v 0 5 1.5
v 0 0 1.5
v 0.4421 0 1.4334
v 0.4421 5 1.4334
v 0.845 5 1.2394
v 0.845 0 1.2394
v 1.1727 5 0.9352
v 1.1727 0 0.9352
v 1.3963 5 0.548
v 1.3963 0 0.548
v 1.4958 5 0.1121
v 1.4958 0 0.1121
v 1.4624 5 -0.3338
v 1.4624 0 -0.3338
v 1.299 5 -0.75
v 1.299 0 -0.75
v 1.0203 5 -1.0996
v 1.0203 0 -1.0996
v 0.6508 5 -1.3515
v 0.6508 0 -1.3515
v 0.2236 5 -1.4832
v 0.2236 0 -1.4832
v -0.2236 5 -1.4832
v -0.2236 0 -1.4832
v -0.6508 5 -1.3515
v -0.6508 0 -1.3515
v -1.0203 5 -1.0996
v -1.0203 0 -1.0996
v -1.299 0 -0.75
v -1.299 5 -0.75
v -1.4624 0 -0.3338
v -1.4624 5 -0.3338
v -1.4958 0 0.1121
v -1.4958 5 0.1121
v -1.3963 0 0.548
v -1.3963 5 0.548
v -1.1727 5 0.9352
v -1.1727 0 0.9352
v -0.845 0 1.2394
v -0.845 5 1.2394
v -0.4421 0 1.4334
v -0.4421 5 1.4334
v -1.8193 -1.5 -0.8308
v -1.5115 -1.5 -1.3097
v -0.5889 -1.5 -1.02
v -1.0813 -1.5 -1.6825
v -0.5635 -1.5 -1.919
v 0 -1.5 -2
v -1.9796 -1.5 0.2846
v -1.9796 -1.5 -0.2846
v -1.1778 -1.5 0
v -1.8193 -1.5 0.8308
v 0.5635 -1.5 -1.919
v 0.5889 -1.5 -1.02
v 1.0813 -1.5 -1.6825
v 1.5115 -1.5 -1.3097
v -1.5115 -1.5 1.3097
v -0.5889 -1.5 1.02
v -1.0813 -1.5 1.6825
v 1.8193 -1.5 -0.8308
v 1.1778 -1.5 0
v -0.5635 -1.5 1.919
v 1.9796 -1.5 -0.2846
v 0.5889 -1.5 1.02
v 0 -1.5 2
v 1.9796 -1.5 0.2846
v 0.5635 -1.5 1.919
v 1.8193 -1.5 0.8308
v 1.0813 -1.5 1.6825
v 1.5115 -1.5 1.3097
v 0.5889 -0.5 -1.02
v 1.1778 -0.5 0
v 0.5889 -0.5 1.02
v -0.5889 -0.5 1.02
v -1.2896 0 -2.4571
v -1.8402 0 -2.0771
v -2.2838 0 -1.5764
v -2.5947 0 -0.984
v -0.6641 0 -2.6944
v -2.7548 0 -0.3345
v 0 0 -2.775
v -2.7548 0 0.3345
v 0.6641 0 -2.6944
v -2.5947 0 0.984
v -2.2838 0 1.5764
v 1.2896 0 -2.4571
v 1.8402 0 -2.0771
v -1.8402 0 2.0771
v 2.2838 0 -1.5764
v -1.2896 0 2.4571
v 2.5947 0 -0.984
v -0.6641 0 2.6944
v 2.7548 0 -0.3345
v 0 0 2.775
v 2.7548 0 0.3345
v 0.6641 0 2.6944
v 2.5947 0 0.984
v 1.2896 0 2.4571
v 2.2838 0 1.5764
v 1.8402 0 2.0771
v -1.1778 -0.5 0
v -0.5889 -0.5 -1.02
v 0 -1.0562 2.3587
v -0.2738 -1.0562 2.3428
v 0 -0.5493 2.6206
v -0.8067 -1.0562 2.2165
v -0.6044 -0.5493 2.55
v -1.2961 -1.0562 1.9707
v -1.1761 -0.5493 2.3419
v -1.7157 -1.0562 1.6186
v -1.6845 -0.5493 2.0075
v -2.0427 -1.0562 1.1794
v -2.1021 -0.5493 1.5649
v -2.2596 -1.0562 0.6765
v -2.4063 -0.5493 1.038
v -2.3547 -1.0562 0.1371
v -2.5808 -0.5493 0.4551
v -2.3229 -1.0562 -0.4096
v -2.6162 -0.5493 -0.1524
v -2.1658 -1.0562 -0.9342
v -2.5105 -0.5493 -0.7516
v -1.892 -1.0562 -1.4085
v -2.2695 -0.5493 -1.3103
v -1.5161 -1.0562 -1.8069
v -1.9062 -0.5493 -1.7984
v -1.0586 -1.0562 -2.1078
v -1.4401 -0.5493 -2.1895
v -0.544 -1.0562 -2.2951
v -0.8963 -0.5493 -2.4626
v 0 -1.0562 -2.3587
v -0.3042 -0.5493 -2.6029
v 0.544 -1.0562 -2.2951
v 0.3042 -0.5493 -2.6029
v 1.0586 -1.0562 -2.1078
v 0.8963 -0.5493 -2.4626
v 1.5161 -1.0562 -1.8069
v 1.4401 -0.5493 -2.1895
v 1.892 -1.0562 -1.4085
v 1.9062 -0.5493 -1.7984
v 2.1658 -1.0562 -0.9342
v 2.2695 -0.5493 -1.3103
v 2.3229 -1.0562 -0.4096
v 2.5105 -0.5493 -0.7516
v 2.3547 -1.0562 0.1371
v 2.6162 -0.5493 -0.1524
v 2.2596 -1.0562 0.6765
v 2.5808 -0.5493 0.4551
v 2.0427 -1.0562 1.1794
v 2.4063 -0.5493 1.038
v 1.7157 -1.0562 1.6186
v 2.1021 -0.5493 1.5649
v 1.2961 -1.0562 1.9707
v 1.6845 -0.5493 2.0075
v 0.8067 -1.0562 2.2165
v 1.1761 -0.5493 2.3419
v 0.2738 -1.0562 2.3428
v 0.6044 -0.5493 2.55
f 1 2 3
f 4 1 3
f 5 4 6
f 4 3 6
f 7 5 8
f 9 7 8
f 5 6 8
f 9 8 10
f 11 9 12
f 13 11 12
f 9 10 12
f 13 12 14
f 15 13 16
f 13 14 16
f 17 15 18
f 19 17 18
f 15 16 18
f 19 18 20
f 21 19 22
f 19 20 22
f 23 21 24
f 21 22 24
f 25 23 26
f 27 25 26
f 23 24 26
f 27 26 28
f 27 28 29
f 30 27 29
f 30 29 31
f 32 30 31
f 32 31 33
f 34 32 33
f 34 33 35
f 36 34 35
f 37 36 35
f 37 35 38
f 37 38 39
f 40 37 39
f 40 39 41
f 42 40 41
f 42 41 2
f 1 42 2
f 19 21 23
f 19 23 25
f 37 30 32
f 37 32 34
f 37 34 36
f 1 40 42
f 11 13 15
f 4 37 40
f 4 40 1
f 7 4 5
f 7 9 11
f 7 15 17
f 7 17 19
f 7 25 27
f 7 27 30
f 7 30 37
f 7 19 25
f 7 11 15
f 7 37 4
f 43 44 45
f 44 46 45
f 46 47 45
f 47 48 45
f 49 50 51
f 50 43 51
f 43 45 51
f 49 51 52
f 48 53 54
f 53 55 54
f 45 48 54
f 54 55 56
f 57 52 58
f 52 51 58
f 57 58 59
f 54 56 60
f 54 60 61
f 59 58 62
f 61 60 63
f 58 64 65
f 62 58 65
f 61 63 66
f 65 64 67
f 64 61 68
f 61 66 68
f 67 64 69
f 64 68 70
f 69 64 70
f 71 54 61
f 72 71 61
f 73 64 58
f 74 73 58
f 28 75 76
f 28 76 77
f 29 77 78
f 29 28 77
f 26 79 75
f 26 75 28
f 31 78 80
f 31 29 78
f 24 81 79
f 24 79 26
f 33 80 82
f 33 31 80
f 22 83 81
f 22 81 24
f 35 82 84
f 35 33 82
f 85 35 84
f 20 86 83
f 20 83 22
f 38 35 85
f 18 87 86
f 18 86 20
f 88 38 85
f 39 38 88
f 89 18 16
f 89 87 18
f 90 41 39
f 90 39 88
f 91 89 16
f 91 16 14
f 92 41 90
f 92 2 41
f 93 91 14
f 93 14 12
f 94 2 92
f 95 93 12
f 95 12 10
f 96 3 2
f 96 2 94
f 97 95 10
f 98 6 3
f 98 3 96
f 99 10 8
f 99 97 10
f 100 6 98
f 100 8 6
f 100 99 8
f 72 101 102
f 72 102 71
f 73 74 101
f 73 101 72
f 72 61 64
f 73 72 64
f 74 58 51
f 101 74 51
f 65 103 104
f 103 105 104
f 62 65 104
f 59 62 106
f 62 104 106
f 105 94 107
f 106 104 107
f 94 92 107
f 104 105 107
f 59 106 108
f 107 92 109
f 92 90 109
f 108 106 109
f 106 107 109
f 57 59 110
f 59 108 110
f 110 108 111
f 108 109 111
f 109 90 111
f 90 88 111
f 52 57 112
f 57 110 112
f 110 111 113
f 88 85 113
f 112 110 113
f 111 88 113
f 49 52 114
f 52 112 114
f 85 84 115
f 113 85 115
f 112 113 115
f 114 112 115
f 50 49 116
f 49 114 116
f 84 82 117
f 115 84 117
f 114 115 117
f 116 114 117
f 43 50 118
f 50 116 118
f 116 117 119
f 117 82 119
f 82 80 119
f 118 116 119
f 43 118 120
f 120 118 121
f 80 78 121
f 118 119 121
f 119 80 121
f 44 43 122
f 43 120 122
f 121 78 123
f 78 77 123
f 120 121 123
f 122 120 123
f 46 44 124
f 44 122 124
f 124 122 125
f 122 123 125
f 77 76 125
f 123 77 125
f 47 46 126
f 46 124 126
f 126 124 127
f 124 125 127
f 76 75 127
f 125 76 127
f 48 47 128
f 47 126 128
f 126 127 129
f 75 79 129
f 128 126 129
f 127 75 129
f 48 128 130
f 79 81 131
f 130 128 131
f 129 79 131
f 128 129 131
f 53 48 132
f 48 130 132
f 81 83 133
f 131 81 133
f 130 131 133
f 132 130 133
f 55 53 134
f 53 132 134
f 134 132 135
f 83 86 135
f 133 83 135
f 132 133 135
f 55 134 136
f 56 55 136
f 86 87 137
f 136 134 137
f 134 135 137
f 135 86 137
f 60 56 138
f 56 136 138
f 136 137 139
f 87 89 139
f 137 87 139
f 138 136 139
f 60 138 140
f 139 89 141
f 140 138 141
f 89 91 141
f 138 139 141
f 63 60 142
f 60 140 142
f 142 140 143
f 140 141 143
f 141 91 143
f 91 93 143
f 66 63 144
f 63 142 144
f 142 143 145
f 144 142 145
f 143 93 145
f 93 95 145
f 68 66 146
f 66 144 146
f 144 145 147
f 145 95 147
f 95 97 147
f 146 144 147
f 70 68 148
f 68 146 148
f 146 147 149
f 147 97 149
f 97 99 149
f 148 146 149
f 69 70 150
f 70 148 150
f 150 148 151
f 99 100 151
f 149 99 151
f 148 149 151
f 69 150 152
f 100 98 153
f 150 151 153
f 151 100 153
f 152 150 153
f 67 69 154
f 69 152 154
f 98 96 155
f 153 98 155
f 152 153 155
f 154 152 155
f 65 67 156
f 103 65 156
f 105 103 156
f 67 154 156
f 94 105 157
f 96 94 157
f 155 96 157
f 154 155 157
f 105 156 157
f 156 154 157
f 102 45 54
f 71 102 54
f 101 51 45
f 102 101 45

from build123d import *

# Parameters (mm, degrees)
SKETCH_1_R          = 1.5
EXTRUDE_1_DEPTH     = 2
SKETCH_2_R          = 2.775
EXTRUDE_2_DEPTH     = 1.5
CUT_EXTRUDE_1_DEPTH = 1
SKETCH_1_8_R        = 1.5
EXTRUDE_5_DEPTH     = 5


with BuildPart() as part:
    # 草图1 → 拉伸1 (new body)
    with BuildSketch(Plane(origin=(0, 0, 0), x_dir=(1, 0, 0), z_dir=(0, 1, 0))):
        Circle(SKETCH_1_R)
    extrude(amount=EXTRUDE_1_DEPTH)

    # 草图2 → Extrude 2 (add)
    with BuildSketch(Plane(origin=(0, 0, 0), x_dir=(-1, 0, 0), z_dir=(0, 1, 0))):
        Circle(SKETCH_2_R)
    extrude(amount=-EXTRUDE_2_DEPTH)

    # 草图4 → 切除-旋转1 (revolve, cut)
    with BuildSketch(Plane(origin=(0, 0, 0), x_dir=(0, 0, -1), z_dir=(1, 0, 0))):
        with BuildLine():
            Line((-2.775, 0), (-2.775, -1.5))
            Line((-2.775, -1.5), (-2, -1.5))
            ThreePointArc((-2, -1.5), (-2.50252997, -0.809432151), (-2.775, 0))
        make_face()
    revolve(axis=Axis((0, 3.165730861, 0), (0, -1, 0)), mode=Mode.SUBTRACT)

    # 草图3 → 切除-拉伸1 (cut)
    with BuildSketch(Plane.XZ.offset(1.5)):
        Polygon((-1.177794549, 0), (-0.588897275, -1.02), (0.588897275, -1.02), (1.177794549, 0), (0.588897275, 1.02), (-0.588897275, 1.02), align=None)
    extrude(amount=-CUT_EXTRUDE_1_DEPTH, mode=Mode.SUBTRACT)

    # 草图1<8> → 凸台-拉伸5 (add)
    with BuildSketch(Plane(origin=(0, 0, 0), x_dir=(1, 0, 0), z_dir=(0, 1, 0))):
        Circle(SKETCH_1_8_R)
    extrude(amount=EXTRUDE_5_DEPTH)


solid = part.part
